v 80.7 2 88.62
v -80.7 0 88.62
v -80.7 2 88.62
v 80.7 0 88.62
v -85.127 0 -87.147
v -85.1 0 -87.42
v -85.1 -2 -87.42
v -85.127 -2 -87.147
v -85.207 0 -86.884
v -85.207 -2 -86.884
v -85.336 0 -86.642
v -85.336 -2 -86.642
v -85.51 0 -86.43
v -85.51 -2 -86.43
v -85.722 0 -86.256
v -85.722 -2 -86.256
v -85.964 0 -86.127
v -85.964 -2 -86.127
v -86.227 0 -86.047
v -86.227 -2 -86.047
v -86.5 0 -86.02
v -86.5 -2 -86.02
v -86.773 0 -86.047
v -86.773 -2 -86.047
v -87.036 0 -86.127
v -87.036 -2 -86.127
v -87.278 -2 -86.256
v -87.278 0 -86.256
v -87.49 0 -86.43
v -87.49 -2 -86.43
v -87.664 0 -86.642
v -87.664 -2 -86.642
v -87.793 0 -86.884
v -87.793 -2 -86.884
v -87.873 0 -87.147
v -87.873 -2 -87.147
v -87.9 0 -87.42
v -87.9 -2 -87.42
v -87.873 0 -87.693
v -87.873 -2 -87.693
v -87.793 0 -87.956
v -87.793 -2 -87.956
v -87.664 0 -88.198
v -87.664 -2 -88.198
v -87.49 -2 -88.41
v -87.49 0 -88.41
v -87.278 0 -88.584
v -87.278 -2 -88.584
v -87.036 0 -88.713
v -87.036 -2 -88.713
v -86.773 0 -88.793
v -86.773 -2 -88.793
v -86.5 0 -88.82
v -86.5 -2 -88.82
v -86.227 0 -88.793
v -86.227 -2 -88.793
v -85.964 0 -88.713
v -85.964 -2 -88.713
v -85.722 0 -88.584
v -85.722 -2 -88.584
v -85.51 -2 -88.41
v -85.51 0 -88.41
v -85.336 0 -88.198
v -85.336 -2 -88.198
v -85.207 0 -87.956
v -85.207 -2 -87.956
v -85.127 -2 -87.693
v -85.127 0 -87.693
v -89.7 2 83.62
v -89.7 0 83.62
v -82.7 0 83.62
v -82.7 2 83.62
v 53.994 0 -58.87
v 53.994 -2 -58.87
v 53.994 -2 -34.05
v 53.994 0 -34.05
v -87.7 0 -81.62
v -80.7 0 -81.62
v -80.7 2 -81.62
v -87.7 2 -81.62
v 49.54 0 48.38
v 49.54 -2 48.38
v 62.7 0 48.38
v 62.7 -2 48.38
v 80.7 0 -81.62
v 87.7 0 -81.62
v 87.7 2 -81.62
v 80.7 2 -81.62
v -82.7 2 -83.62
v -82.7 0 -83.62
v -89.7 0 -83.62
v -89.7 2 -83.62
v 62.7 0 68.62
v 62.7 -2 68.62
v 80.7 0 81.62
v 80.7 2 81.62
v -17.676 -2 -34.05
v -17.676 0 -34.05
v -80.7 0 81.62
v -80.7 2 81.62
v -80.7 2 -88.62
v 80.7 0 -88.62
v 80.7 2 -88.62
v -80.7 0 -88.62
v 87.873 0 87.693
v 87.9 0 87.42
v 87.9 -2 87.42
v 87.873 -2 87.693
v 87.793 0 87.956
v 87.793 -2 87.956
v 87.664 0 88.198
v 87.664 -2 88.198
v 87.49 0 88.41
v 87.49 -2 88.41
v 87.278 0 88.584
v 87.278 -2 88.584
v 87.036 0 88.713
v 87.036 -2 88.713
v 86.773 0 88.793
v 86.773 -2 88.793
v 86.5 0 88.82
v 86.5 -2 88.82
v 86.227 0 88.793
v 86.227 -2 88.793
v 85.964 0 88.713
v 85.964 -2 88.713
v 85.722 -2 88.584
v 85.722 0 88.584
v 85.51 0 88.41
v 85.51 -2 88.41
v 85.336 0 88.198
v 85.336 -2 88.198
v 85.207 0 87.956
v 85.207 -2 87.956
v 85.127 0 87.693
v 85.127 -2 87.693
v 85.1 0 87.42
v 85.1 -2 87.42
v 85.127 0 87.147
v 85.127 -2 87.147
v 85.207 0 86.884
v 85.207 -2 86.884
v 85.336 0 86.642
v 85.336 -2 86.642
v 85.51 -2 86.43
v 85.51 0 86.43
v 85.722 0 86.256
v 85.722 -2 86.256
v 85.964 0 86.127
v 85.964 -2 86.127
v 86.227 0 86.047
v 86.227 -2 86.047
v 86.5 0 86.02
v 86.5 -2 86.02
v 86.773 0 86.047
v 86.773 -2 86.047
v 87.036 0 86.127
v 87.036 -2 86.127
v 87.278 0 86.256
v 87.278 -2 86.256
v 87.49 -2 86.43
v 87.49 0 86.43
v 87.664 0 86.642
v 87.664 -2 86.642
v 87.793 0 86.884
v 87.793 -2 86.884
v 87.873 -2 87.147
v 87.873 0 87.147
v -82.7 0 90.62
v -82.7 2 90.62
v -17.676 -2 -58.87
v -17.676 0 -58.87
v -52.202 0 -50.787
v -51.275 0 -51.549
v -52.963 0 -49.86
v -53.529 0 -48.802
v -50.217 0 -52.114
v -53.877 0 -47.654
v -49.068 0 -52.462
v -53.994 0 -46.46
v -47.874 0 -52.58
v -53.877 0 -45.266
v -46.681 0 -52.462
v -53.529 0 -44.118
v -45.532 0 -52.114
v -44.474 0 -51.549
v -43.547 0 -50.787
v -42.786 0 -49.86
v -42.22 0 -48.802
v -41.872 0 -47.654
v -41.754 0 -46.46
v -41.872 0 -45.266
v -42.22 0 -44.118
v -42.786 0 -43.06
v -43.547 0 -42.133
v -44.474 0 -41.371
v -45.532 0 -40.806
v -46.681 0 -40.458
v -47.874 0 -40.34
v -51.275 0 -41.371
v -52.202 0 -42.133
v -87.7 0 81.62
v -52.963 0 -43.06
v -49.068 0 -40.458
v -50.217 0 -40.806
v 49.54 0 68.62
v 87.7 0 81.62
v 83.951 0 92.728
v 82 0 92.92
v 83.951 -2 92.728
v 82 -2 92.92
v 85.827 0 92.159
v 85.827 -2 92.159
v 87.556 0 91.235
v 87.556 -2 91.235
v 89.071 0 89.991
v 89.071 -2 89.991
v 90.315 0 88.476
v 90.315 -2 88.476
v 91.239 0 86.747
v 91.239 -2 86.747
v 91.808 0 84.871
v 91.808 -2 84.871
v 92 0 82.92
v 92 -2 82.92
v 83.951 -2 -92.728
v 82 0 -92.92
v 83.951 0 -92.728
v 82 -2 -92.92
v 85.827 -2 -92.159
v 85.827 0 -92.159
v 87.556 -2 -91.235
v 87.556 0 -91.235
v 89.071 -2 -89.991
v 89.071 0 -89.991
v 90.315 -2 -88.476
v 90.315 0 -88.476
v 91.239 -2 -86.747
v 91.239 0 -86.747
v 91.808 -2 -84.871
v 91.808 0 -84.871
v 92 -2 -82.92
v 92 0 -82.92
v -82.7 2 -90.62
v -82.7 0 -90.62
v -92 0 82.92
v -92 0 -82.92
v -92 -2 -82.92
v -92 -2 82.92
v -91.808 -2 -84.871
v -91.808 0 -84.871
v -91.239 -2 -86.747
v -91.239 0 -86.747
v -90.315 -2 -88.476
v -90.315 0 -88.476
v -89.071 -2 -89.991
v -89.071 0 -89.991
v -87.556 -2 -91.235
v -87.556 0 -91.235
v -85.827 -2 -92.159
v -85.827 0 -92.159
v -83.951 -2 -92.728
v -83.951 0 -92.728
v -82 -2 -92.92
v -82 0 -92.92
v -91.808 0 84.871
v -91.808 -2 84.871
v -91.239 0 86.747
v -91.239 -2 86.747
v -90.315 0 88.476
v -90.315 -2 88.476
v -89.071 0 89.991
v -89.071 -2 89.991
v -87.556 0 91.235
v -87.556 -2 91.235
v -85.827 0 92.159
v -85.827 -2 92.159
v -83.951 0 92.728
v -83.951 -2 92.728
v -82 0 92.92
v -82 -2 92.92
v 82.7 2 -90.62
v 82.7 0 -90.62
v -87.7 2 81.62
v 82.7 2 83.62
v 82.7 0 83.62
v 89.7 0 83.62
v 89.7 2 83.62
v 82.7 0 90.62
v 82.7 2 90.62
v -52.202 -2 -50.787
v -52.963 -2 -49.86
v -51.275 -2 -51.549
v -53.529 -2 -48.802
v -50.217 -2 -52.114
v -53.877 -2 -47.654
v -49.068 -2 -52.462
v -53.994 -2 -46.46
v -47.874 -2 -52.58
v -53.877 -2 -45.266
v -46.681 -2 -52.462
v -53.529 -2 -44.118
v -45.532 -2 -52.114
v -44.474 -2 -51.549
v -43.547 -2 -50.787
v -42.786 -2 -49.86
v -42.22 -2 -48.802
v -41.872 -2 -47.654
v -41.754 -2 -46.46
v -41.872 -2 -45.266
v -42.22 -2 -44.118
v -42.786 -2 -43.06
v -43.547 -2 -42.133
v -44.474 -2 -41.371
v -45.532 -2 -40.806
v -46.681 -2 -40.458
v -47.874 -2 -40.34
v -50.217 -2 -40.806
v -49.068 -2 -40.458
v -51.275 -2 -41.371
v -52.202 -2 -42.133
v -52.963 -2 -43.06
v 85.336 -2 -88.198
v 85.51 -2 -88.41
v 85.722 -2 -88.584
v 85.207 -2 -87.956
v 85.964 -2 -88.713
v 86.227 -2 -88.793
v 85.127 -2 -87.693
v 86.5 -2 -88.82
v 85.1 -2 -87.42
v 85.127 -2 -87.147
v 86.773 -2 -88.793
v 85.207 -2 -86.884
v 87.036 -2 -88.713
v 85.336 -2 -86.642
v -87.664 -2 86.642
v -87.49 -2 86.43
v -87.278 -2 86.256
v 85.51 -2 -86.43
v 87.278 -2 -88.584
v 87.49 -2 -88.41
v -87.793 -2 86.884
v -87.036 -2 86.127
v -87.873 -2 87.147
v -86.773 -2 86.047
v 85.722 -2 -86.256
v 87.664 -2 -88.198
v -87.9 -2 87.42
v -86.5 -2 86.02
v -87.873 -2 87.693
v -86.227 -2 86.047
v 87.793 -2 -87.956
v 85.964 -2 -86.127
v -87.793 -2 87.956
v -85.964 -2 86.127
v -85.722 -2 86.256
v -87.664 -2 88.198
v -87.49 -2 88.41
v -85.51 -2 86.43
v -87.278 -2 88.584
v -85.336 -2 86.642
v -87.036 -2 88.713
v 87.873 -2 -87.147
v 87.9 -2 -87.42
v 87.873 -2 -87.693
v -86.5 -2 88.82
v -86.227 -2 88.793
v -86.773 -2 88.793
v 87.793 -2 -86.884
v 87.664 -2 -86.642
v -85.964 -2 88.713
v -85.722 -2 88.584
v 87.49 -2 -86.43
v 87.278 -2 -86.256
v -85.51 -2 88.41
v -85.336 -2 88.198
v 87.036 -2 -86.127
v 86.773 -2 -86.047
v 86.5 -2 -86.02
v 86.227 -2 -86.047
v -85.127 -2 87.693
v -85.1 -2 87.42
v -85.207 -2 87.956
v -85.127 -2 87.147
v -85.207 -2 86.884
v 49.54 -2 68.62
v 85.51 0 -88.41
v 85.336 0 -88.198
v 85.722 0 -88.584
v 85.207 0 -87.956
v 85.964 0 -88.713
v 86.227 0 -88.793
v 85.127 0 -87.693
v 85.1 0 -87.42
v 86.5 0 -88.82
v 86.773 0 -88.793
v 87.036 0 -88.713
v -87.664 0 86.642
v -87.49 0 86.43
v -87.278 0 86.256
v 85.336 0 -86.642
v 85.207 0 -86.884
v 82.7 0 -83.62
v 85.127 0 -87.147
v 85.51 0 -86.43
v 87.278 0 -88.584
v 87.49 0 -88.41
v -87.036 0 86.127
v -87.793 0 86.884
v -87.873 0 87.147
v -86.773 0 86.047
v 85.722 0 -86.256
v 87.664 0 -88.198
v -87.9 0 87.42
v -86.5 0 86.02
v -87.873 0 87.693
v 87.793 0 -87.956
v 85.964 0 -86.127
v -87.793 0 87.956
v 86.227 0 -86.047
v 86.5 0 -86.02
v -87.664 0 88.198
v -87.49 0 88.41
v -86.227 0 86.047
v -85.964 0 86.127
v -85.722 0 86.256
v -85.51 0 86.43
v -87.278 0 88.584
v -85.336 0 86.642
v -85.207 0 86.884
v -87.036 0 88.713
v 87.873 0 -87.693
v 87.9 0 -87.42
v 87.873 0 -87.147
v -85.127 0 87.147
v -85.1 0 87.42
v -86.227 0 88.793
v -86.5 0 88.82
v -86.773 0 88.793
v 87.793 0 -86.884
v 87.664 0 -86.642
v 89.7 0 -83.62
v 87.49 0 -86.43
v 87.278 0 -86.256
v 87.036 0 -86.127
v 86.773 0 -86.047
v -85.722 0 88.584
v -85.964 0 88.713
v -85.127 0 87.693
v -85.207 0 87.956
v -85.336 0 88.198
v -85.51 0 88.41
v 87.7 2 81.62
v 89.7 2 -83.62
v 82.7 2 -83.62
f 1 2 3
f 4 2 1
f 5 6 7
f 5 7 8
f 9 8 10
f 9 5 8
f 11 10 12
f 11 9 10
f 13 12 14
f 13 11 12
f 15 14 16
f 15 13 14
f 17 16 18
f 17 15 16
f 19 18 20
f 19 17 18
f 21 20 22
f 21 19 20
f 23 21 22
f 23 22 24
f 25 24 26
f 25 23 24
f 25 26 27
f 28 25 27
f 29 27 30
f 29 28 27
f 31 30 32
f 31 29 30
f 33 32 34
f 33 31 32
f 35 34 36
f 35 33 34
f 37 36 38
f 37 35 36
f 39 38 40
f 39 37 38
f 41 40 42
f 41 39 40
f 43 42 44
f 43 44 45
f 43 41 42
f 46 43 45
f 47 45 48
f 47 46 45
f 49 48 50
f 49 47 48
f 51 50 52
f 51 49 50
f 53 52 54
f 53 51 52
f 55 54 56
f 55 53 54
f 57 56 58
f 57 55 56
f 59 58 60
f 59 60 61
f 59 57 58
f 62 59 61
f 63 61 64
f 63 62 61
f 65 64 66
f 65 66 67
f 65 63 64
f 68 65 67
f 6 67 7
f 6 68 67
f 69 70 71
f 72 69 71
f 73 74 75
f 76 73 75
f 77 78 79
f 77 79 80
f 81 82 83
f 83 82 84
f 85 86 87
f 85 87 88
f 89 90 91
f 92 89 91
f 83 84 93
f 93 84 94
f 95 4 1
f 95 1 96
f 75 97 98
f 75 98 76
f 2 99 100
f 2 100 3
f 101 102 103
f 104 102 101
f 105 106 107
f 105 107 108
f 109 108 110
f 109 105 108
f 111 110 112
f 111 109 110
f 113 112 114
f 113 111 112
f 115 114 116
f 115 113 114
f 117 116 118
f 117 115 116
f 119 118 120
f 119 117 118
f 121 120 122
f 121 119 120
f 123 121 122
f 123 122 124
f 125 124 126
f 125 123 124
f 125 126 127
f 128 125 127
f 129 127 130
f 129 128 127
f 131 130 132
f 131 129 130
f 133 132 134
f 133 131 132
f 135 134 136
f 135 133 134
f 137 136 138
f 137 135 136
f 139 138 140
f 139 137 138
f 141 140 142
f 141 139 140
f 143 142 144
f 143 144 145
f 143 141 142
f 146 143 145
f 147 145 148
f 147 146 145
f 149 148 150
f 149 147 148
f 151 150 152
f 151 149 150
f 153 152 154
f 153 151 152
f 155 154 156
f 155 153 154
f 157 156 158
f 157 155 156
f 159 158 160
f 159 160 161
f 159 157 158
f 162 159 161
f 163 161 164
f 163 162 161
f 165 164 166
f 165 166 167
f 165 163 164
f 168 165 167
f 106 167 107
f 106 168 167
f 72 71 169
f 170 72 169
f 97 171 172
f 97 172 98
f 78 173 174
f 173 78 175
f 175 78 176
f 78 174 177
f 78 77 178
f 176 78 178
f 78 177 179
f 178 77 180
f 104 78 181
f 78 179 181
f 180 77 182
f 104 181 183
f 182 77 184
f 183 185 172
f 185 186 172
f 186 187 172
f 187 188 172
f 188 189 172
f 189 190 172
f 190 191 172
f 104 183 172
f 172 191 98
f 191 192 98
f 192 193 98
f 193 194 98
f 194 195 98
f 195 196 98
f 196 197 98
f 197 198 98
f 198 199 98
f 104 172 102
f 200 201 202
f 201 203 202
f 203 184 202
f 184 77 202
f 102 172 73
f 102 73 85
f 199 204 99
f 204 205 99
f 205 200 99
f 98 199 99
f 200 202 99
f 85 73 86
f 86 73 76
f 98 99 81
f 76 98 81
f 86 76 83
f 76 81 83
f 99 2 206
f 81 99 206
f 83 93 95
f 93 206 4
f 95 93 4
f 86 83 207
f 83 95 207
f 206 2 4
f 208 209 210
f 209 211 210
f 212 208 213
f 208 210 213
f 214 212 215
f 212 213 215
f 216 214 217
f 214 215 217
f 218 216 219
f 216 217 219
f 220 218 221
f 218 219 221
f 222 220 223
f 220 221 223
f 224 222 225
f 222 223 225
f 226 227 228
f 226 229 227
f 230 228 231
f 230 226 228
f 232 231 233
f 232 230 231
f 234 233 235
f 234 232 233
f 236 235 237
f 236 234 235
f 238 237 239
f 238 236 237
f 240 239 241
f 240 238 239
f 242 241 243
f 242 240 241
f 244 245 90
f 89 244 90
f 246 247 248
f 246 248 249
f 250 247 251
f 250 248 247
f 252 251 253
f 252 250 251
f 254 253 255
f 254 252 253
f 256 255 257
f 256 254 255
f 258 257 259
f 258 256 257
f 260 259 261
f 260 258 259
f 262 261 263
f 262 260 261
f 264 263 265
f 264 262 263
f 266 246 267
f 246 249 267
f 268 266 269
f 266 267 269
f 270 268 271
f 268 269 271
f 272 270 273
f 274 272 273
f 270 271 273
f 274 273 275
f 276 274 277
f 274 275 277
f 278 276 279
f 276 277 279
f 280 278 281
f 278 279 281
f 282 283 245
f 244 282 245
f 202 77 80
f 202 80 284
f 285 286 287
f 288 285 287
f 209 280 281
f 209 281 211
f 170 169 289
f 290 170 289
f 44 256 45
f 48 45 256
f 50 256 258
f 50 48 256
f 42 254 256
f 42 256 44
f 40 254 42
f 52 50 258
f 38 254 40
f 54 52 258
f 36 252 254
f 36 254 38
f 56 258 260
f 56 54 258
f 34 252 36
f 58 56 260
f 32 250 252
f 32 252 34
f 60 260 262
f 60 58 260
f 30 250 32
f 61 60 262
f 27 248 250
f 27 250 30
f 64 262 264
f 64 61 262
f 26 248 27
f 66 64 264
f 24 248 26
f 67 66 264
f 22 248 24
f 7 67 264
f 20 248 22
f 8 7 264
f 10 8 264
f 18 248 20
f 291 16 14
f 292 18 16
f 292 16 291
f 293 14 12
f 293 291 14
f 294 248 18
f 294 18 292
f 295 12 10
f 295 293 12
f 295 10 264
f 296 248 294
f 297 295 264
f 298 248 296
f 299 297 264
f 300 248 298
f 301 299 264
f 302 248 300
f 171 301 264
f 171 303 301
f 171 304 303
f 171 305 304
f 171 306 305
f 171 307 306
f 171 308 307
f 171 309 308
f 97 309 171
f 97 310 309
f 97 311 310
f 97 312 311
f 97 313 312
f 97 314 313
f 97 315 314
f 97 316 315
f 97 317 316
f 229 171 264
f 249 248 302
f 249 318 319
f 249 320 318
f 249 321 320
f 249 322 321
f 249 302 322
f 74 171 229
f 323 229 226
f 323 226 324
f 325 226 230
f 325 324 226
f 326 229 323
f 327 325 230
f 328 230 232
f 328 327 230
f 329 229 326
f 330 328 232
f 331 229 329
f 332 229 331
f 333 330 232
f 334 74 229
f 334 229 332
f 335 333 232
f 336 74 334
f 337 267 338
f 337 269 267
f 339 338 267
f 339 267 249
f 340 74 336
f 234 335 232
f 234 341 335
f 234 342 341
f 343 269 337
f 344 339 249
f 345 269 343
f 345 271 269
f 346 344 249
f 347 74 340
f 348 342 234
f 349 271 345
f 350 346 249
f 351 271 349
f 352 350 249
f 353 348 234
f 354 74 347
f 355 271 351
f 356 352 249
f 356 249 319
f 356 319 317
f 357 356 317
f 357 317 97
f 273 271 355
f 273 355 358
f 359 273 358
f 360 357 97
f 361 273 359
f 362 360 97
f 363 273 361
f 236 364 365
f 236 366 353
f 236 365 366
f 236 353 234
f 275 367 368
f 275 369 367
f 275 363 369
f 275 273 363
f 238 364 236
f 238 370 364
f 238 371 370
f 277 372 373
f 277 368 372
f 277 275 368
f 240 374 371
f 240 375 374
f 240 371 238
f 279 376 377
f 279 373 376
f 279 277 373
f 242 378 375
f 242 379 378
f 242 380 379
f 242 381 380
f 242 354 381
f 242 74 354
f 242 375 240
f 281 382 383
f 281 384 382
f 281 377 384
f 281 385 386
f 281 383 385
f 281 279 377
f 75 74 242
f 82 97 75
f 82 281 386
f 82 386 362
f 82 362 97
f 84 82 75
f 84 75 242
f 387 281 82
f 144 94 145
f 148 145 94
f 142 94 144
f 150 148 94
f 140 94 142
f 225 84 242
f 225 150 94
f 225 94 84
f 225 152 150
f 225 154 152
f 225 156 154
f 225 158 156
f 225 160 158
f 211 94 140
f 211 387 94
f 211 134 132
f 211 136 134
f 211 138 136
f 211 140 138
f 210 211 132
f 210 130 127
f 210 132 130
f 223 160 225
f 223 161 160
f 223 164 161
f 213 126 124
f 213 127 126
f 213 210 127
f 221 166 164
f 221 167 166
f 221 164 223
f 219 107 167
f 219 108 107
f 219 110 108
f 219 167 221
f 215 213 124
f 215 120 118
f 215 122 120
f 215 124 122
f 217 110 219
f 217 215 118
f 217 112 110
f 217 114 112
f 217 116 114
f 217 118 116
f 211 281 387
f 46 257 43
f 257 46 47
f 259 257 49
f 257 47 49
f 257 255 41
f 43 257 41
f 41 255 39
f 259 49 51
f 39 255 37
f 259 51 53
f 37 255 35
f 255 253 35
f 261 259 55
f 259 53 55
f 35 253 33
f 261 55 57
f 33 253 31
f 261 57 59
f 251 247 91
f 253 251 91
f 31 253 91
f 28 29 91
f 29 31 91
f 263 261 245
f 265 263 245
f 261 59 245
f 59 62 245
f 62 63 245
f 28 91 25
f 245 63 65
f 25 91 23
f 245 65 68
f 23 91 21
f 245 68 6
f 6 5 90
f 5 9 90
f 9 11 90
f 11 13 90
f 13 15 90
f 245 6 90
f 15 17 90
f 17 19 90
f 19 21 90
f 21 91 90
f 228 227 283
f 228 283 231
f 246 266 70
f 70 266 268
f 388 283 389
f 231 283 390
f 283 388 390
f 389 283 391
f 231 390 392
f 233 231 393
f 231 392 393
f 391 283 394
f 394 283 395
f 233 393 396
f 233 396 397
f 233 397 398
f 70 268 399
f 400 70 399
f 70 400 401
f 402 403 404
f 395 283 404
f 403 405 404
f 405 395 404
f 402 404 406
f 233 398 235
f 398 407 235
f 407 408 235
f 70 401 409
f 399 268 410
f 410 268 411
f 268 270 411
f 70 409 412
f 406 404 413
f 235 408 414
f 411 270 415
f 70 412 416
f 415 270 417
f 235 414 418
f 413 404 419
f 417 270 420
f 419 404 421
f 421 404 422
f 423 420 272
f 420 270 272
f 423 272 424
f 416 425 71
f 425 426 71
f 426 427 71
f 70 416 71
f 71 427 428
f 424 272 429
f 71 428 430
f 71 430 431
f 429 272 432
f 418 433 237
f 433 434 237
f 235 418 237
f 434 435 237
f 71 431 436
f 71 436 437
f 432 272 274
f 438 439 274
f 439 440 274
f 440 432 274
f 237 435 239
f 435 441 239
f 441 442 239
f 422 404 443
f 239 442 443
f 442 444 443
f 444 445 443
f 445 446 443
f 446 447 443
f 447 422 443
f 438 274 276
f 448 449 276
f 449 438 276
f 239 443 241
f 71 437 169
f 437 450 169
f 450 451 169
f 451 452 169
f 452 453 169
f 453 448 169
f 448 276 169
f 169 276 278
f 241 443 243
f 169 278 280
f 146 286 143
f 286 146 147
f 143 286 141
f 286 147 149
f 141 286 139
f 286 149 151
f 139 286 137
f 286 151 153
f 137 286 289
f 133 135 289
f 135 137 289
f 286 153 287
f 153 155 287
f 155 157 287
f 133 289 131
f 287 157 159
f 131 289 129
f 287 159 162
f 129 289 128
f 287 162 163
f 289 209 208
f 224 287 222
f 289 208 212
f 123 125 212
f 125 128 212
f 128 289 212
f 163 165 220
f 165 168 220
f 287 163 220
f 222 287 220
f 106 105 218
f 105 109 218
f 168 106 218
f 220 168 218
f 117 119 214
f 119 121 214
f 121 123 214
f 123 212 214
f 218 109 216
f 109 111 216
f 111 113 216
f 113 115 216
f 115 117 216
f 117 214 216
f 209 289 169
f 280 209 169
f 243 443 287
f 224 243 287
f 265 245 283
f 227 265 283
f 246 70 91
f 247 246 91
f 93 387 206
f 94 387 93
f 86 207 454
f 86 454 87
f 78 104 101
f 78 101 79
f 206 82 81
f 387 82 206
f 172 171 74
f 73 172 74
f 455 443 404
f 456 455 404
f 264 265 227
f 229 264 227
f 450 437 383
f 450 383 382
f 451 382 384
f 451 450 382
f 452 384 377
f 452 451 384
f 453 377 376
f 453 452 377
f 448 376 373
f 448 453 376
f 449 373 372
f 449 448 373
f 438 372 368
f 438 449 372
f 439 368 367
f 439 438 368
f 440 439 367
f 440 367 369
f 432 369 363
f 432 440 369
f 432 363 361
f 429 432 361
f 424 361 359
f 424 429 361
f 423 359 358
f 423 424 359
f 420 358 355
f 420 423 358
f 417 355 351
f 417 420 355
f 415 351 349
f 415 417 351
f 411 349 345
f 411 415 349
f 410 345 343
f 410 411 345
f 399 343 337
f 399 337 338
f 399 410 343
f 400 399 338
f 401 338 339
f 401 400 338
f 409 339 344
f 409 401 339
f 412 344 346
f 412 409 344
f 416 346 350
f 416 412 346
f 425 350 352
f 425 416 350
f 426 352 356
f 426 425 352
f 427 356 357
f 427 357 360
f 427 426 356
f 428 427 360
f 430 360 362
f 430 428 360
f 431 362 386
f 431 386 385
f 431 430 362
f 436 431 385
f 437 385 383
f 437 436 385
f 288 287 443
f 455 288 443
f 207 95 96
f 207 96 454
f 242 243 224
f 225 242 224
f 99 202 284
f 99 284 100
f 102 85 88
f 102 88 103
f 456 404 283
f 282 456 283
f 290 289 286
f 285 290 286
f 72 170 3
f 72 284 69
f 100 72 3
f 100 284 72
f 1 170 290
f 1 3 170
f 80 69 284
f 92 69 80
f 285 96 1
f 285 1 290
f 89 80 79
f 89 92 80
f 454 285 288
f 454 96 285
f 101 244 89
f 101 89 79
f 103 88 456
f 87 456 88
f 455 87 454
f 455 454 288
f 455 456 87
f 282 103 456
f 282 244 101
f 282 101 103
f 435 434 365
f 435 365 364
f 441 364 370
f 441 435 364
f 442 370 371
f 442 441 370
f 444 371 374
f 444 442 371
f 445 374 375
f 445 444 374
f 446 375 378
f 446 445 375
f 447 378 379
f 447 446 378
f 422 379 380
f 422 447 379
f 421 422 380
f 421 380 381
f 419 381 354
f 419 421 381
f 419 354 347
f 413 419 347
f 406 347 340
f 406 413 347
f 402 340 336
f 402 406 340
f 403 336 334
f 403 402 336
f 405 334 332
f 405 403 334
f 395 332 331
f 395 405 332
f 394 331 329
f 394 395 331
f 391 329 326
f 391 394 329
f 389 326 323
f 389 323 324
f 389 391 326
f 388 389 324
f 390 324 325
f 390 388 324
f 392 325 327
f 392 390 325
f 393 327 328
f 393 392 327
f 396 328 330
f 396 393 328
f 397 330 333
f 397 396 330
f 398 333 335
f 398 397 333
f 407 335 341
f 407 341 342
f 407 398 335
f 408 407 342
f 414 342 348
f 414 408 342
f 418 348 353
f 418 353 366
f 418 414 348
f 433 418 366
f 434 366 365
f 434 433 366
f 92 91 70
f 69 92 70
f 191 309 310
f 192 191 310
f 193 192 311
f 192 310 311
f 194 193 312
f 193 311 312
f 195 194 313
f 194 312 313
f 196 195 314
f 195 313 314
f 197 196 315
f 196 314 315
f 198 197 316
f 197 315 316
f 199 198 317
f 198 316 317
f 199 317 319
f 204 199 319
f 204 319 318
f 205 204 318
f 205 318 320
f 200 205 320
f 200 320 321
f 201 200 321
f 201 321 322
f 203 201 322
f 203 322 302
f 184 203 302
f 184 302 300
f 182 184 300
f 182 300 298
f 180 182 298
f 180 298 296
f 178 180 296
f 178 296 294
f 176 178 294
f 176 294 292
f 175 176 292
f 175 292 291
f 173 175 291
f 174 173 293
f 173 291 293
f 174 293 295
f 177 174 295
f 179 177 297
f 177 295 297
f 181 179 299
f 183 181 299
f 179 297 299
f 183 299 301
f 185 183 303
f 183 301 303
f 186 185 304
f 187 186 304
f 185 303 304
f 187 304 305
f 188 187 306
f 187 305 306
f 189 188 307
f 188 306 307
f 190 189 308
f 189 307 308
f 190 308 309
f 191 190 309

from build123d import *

# Parameters (mm, degrees)
BOSS_EXTRUDE1_DEPTH = 2
SKETCH13_W          = 184
SKETCH13_H          = 185.84
SKETCH13_R          = 1.4
BOSS_EXTRUDE6_DEPTH = 2
FILLET3_R           = 10
CUT_EXTRUDE9_REACH  = 6
SKETCH14_R          = 6.12
SKETCH14_W          = 71.67
SKETCH14_H          = 24.82
SKETCH14_W_2        = 13.16
SKETCH14_H_2        = 20.24


with BuildPart() as part:
    # Sketch1 → Boss-Extrude1 (new body)
    with BuildSketch(Plane(origin=(0, 0, 0), x_dir=(1, 0, 0), z_dir=(0, 1, 0))):
        Polygon((-82.7, -90.62), (82.7, -90.62), (82.7, -83.62), (89.7, -83.62), (89.7, 83.62), (82.7, 83.62), (82.7, 90.62), (-82.7, 90.62), (-82.7, 83.62), (-89.7, 83.62), (-89.7, -83.62), (-82.7, -83.62), align=None)
        Polygon((-80.7, -88.62), (80.7, -88.62), (80.7, -81.62), (87.7, -81.62), (87.7, 81.62), (80.7, 81.62), (80.7, 88.62), (-80.7, 88.62), (-80.7, 81.62), (-87.7, 81.62), (-87.7, -81.62), (-80.7, -81.62), align=None, mode=Mode.SUBTRACT)
    extrude(amount=BOSS_EXTRUDE1_DEPTH)

    # Sketch13 → Boss-Extrude6 (add)
    with BuildSketch(Plane.XZ):
        Rectangle(SKETCH13_W, SKETCH13_H)
        with Locations((-86.5, -87.42)):
            Circle(SKETCH13_R, mode=Mode.SUBTRACT)
        with Locations((86.5, -87.42)):
            Circle(SKETCH13_R, mode=Mode.SUBTRACT)
        with Locations((86.5, 87.42)):
            Circle(SKETCH13_R, mode=Mode.SUBTRACT)
        with Locations((-86.5, 87.42)):
            Circle(SKETCH13_R, mode=Mode.SUBTRACT)
    extrude(amount=BOSS_EXTRUDE6_DEPTH)

    # Fillet3
    fillet3_edges = [part.edges().sort_by_distance(p)[0] for p in [
        (-92, -1, 92.92),
        (-92, -1, -92.92),
        (92, -1, -92.92),
        (92, -1, 92.92),
    ]]
    fillet(fillet3_edges, radius=FILLET3_R)

    # Sketch14 → Cut-Extrude9 (cut, up to next)
    with BuildSketch(Plane.XZ.offset(2), mode=Mode.PRIVATE) as cut_extrude9_sk1:
        with Locations((-47.874498459, -46.46)):
            Circle(SKETCH14_R)
    cut_extrude9_tool1 = extrude(cut_extrude9_sk1.sketch, amount=-CUT_EXTRUDE9_REACH, mode=Mode.PRIVATE) & part.part
    add(cut_extrude9_tool1.solids().sort_by_distance((-47.874498, -2, -46.46))[0], mode=Mode.SUBTRACT)
    # Sketch14 → Cut-Extrude9 (cut, up to next)
    with BuildSketch(Plane.XZ.offset(2), mode=Mode.PRIVATE) as cut_extrude9_sk2:
        with Locations((18.159498459, -46.46)):
            Rectangle(SKETCH14_W, SKETCH14_H)
    cut_extrude9_tool2 = extrude(cut_extrude9_sk2.sketch, amount=-CUT_EXTRUDE9_REACH, mode=Mode.PRIVATE) & part.part
    add(cut_extrude9_tool2.solids().sort_by_distance((18.159498, -2, -46.46))[0], mode=Mode.SUBTRACT)
    # Sketch14 → Cut-Extrude9 (cut, up to next)
    with BuildSketch(Plane.XZ.offset(2), mode=Mode.PRIVATE) as cut_extrude9_sk3:
        with Locations((56.12, 58.5)):
            Rectangle(SKETCH14_W_2, SKETCH14_H_2)
    cut_extrude9_tool3 = extrude(cut_extrude9_sk3.sketch, amount=-CUT_EXTRUDE9_REACH, mode=Mode.PRIVATE) & part.part
    add(cut_extrude9_tool3.solids().sort_by_distance((56.12, -2, 58.5))[0], mode=Mode.SUBTRACT)


solid = part.part
